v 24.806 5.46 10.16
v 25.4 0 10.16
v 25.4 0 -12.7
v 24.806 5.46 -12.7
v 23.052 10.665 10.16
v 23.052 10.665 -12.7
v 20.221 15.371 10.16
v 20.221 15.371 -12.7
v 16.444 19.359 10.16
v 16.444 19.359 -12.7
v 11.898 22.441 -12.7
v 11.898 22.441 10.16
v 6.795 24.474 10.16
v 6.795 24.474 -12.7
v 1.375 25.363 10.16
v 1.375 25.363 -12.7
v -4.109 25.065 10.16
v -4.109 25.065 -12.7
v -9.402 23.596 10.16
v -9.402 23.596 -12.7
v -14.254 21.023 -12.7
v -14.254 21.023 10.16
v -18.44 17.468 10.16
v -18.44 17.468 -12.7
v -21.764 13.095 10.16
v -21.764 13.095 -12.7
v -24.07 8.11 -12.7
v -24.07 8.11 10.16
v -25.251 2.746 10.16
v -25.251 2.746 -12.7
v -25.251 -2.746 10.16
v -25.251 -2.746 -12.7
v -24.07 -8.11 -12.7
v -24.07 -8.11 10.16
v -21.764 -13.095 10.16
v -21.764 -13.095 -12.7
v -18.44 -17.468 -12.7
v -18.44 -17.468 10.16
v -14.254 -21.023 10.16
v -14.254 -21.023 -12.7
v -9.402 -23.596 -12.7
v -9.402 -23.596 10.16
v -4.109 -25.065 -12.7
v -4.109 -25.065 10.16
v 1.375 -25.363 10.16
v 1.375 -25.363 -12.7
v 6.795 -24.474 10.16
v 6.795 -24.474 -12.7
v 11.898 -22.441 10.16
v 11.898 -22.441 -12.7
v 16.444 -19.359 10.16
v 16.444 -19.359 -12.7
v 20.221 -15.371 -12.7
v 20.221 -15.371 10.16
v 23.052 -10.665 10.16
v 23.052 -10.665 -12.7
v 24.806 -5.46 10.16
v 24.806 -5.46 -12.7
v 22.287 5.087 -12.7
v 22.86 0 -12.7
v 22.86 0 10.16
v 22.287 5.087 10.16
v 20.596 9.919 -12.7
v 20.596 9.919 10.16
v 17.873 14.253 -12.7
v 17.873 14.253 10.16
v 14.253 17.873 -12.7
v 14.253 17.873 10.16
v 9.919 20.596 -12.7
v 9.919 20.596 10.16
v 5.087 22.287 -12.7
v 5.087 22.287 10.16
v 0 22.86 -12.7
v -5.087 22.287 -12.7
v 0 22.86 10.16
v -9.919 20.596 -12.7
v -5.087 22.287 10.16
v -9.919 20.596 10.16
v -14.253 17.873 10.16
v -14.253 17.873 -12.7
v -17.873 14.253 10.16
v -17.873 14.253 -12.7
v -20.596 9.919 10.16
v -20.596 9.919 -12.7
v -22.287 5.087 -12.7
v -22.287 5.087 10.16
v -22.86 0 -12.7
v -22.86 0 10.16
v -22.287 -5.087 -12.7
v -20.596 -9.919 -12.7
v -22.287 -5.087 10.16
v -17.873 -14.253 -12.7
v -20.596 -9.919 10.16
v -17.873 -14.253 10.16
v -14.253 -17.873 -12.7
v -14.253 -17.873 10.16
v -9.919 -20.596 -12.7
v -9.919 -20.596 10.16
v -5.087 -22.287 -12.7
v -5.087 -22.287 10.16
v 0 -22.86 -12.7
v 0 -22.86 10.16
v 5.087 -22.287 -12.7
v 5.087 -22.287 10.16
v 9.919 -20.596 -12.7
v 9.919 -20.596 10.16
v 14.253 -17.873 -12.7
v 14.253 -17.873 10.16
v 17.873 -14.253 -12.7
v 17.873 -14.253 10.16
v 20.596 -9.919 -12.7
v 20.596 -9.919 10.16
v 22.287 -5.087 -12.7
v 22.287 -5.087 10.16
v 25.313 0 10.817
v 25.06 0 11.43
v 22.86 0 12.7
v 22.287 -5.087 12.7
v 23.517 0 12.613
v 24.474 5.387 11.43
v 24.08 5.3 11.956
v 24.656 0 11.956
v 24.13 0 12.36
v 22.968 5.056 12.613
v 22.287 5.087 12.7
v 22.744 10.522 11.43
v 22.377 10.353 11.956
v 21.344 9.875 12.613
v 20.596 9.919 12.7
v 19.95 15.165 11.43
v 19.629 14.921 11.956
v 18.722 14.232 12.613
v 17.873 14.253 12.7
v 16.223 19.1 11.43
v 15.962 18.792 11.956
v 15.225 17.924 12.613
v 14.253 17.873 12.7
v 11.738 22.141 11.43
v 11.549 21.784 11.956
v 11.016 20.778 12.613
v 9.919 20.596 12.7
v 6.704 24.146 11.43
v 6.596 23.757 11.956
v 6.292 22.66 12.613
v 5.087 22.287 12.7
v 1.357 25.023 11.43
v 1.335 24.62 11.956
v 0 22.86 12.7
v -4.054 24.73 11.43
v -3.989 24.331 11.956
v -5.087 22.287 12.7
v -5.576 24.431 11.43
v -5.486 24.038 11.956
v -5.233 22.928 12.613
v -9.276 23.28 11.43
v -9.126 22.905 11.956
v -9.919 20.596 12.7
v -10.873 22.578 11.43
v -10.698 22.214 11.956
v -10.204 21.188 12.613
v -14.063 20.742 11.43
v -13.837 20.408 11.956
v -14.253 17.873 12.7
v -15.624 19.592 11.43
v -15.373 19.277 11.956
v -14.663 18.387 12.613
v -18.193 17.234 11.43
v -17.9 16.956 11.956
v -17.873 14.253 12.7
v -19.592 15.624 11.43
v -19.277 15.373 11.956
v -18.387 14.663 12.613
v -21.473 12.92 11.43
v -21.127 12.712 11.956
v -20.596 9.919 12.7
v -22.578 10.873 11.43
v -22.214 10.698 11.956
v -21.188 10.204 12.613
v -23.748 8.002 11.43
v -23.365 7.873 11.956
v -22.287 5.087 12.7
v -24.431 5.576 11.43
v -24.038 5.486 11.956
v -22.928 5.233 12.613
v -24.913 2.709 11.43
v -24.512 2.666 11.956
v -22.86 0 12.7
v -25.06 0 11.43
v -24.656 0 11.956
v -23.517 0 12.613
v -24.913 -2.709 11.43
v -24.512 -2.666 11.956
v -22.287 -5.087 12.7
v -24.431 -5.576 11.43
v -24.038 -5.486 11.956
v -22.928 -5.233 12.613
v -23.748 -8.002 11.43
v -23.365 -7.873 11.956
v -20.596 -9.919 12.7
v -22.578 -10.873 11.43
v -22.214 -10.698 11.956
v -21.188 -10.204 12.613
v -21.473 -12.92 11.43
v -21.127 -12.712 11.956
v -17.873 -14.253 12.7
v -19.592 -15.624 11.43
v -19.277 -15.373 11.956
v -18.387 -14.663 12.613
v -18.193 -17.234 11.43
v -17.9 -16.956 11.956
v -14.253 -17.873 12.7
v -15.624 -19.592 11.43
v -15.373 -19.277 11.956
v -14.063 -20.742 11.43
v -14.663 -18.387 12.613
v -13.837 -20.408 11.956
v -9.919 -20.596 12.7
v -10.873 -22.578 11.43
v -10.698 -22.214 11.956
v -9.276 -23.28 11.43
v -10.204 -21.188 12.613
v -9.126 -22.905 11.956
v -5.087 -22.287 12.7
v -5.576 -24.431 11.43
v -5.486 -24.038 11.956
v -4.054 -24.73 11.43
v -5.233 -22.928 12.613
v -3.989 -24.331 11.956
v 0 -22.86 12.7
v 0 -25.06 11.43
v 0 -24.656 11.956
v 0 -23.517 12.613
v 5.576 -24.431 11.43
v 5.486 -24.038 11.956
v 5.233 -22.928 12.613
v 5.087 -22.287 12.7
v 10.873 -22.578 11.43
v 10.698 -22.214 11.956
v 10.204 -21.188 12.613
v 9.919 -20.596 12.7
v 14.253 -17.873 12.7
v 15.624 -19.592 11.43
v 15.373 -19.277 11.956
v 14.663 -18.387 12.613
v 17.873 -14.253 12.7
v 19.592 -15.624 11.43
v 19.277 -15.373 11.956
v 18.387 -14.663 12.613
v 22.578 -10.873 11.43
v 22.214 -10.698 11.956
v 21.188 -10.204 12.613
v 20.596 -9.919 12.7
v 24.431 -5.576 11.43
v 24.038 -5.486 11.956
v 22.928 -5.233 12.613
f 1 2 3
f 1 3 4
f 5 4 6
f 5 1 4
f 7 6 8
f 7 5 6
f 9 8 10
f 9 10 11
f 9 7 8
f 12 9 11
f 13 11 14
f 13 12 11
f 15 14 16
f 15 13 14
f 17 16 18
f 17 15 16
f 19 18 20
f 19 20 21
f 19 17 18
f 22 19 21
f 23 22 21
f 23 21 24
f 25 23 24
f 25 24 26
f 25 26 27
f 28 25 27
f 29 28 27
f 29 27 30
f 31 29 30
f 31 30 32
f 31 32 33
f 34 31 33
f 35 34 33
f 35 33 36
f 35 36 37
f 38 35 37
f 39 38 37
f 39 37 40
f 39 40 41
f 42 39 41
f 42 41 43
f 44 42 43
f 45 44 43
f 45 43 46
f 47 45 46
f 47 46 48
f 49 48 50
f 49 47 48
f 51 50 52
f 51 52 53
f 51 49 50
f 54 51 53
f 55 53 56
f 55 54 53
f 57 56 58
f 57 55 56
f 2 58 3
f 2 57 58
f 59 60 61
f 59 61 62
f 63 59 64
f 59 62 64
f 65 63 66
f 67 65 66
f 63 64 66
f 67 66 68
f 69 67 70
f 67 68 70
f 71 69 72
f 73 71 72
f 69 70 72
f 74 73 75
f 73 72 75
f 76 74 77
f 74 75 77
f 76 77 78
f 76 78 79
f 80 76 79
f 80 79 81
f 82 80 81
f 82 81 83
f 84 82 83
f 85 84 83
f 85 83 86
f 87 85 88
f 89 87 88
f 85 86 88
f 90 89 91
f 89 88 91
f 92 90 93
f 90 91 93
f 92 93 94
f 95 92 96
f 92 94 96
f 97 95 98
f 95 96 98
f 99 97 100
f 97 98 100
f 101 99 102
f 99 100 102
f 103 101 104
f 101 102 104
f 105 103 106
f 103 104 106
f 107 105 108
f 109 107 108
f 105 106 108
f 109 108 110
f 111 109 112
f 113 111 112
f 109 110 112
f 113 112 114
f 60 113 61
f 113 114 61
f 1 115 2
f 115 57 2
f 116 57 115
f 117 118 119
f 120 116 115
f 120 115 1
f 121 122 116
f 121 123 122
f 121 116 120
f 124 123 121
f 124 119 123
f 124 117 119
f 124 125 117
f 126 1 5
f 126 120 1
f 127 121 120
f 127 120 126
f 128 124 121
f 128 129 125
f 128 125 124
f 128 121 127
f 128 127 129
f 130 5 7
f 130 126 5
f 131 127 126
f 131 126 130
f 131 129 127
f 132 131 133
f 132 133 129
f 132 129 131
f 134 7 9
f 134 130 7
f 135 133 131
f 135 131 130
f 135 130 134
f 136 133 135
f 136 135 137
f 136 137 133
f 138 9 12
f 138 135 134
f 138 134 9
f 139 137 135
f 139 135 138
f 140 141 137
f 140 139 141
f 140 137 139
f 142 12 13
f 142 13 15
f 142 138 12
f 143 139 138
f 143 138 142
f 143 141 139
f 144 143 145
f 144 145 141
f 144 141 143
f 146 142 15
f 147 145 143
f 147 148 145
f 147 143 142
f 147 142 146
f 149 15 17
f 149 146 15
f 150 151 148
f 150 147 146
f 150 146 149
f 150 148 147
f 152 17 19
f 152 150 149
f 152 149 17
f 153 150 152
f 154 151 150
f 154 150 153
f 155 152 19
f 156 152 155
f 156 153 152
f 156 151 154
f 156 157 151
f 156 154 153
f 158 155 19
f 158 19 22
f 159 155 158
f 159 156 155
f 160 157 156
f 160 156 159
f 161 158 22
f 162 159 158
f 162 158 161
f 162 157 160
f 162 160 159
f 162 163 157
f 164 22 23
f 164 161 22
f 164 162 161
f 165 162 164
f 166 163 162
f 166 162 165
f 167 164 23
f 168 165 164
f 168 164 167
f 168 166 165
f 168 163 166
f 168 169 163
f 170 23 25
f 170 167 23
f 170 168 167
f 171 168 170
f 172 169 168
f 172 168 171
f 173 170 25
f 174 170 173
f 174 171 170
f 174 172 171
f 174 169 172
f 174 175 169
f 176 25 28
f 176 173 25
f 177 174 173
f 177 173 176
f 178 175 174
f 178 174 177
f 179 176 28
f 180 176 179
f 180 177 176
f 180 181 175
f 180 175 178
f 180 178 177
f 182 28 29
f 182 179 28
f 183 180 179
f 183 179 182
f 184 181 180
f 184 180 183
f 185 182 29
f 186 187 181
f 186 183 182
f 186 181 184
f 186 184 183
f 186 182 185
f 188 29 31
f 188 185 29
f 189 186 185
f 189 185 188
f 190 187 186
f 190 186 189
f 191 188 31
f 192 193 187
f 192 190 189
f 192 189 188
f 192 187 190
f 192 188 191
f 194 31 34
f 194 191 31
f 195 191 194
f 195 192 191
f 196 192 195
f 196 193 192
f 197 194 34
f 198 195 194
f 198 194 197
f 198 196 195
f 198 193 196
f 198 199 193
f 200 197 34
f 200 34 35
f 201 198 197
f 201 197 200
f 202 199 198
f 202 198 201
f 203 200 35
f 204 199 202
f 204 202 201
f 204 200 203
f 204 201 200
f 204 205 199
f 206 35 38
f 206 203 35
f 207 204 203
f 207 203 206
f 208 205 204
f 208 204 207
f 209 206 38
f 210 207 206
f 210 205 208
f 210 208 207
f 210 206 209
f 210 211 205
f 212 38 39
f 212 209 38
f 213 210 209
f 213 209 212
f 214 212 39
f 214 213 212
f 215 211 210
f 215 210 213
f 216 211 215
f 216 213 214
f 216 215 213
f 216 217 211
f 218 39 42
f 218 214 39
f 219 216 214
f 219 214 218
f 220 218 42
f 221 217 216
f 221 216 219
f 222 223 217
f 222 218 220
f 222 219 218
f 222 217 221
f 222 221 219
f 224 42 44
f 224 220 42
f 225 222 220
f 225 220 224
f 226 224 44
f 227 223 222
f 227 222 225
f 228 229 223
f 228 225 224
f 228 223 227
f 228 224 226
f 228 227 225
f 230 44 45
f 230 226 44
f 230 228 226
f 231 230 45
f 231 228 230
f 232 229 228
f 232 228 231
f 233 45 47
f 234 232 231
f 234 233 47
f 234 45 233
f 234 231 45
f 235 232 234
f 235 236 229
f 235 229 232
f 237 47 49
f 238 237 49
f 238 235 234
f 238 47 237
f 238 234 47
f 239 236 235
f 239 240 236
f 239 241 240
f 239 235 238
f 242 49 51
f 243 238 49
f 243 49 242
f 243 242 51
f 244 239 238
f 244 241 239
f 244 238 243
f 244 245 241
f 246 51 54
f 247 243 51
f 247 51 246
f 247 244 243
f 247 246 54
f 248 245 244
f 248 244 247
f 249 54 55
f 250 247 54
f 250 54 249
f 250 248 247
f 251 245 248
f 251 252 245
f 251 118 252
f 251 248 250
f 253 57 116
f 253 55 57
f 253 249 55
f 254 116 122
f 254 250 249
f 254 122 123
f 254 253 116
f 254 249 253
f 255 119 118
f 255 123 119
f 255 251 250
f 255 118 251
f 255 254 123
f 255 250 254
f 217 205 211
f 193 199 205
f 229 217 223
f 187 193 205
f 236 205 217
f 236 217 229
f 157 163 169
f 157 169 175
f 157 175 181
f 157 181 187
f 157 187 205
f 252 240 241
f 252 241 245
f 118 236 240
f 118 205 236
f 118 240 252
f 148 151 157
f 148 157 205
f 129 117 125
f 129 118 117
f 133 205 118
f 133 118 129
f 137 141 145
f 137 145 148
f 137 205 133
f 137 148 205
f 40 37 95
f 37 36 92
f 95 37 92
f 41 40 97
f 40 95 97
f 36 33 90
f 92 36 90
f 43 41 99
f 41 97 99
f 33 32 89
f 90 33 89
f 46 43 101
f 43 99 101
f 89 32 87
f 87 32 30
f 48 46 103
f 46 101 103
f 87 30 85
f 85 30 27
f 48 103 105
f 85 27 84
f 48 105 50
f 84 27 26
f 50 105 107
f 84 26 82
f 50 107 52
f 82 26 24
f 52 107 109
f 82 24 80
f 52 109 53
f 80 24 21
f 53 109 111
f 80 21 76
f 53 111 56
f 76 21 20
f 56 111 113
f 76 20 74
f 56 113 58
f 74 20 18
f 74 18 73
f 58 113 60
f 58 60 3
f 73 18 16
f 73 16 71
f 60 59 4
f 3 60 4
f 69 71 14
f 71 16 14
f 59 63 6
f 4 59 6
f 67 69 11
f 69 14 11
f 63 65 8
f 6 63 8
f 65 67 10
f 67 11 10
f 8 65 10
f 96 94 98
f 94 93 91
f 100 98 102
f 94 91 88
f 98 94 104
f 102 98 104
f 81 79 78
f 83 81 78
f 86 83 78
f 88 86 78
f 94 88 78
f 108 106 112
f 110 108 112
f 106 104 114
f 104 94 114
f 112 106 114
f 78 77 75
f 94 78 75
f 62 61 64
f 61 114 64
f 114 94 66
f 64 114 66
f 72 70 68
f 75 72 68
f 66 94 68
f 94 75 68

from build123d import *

# Parameters (mm, degrees)
F0_R     = 25.4
F1_DEPTH = 12.7
F2_T     = -2.54
F3_R     = 2.54


with BuildPart() as f1:
    # F0 (on Top) → F1 (new body, symmetric)
    with BuildSketch(Plane.XY):
        Circle(F0_R)
    extrude(amount=F1_DEPTH, both=True)

    # F2
    f2_openings = [f1.faces().sort_by_distance(p)[0] for p in [
        (0, 0, -12.7),
    ]]
    offset(amount=F2_T, openings=f2_openings)

    # F3
    f3_edges = [f1.edges().sort_by_distance(p)[0] for p in [
        (-25.4, 0, 12.7),
    ]]
    fillet(f3_edges, radius=F3_R)


solid = f1.part
